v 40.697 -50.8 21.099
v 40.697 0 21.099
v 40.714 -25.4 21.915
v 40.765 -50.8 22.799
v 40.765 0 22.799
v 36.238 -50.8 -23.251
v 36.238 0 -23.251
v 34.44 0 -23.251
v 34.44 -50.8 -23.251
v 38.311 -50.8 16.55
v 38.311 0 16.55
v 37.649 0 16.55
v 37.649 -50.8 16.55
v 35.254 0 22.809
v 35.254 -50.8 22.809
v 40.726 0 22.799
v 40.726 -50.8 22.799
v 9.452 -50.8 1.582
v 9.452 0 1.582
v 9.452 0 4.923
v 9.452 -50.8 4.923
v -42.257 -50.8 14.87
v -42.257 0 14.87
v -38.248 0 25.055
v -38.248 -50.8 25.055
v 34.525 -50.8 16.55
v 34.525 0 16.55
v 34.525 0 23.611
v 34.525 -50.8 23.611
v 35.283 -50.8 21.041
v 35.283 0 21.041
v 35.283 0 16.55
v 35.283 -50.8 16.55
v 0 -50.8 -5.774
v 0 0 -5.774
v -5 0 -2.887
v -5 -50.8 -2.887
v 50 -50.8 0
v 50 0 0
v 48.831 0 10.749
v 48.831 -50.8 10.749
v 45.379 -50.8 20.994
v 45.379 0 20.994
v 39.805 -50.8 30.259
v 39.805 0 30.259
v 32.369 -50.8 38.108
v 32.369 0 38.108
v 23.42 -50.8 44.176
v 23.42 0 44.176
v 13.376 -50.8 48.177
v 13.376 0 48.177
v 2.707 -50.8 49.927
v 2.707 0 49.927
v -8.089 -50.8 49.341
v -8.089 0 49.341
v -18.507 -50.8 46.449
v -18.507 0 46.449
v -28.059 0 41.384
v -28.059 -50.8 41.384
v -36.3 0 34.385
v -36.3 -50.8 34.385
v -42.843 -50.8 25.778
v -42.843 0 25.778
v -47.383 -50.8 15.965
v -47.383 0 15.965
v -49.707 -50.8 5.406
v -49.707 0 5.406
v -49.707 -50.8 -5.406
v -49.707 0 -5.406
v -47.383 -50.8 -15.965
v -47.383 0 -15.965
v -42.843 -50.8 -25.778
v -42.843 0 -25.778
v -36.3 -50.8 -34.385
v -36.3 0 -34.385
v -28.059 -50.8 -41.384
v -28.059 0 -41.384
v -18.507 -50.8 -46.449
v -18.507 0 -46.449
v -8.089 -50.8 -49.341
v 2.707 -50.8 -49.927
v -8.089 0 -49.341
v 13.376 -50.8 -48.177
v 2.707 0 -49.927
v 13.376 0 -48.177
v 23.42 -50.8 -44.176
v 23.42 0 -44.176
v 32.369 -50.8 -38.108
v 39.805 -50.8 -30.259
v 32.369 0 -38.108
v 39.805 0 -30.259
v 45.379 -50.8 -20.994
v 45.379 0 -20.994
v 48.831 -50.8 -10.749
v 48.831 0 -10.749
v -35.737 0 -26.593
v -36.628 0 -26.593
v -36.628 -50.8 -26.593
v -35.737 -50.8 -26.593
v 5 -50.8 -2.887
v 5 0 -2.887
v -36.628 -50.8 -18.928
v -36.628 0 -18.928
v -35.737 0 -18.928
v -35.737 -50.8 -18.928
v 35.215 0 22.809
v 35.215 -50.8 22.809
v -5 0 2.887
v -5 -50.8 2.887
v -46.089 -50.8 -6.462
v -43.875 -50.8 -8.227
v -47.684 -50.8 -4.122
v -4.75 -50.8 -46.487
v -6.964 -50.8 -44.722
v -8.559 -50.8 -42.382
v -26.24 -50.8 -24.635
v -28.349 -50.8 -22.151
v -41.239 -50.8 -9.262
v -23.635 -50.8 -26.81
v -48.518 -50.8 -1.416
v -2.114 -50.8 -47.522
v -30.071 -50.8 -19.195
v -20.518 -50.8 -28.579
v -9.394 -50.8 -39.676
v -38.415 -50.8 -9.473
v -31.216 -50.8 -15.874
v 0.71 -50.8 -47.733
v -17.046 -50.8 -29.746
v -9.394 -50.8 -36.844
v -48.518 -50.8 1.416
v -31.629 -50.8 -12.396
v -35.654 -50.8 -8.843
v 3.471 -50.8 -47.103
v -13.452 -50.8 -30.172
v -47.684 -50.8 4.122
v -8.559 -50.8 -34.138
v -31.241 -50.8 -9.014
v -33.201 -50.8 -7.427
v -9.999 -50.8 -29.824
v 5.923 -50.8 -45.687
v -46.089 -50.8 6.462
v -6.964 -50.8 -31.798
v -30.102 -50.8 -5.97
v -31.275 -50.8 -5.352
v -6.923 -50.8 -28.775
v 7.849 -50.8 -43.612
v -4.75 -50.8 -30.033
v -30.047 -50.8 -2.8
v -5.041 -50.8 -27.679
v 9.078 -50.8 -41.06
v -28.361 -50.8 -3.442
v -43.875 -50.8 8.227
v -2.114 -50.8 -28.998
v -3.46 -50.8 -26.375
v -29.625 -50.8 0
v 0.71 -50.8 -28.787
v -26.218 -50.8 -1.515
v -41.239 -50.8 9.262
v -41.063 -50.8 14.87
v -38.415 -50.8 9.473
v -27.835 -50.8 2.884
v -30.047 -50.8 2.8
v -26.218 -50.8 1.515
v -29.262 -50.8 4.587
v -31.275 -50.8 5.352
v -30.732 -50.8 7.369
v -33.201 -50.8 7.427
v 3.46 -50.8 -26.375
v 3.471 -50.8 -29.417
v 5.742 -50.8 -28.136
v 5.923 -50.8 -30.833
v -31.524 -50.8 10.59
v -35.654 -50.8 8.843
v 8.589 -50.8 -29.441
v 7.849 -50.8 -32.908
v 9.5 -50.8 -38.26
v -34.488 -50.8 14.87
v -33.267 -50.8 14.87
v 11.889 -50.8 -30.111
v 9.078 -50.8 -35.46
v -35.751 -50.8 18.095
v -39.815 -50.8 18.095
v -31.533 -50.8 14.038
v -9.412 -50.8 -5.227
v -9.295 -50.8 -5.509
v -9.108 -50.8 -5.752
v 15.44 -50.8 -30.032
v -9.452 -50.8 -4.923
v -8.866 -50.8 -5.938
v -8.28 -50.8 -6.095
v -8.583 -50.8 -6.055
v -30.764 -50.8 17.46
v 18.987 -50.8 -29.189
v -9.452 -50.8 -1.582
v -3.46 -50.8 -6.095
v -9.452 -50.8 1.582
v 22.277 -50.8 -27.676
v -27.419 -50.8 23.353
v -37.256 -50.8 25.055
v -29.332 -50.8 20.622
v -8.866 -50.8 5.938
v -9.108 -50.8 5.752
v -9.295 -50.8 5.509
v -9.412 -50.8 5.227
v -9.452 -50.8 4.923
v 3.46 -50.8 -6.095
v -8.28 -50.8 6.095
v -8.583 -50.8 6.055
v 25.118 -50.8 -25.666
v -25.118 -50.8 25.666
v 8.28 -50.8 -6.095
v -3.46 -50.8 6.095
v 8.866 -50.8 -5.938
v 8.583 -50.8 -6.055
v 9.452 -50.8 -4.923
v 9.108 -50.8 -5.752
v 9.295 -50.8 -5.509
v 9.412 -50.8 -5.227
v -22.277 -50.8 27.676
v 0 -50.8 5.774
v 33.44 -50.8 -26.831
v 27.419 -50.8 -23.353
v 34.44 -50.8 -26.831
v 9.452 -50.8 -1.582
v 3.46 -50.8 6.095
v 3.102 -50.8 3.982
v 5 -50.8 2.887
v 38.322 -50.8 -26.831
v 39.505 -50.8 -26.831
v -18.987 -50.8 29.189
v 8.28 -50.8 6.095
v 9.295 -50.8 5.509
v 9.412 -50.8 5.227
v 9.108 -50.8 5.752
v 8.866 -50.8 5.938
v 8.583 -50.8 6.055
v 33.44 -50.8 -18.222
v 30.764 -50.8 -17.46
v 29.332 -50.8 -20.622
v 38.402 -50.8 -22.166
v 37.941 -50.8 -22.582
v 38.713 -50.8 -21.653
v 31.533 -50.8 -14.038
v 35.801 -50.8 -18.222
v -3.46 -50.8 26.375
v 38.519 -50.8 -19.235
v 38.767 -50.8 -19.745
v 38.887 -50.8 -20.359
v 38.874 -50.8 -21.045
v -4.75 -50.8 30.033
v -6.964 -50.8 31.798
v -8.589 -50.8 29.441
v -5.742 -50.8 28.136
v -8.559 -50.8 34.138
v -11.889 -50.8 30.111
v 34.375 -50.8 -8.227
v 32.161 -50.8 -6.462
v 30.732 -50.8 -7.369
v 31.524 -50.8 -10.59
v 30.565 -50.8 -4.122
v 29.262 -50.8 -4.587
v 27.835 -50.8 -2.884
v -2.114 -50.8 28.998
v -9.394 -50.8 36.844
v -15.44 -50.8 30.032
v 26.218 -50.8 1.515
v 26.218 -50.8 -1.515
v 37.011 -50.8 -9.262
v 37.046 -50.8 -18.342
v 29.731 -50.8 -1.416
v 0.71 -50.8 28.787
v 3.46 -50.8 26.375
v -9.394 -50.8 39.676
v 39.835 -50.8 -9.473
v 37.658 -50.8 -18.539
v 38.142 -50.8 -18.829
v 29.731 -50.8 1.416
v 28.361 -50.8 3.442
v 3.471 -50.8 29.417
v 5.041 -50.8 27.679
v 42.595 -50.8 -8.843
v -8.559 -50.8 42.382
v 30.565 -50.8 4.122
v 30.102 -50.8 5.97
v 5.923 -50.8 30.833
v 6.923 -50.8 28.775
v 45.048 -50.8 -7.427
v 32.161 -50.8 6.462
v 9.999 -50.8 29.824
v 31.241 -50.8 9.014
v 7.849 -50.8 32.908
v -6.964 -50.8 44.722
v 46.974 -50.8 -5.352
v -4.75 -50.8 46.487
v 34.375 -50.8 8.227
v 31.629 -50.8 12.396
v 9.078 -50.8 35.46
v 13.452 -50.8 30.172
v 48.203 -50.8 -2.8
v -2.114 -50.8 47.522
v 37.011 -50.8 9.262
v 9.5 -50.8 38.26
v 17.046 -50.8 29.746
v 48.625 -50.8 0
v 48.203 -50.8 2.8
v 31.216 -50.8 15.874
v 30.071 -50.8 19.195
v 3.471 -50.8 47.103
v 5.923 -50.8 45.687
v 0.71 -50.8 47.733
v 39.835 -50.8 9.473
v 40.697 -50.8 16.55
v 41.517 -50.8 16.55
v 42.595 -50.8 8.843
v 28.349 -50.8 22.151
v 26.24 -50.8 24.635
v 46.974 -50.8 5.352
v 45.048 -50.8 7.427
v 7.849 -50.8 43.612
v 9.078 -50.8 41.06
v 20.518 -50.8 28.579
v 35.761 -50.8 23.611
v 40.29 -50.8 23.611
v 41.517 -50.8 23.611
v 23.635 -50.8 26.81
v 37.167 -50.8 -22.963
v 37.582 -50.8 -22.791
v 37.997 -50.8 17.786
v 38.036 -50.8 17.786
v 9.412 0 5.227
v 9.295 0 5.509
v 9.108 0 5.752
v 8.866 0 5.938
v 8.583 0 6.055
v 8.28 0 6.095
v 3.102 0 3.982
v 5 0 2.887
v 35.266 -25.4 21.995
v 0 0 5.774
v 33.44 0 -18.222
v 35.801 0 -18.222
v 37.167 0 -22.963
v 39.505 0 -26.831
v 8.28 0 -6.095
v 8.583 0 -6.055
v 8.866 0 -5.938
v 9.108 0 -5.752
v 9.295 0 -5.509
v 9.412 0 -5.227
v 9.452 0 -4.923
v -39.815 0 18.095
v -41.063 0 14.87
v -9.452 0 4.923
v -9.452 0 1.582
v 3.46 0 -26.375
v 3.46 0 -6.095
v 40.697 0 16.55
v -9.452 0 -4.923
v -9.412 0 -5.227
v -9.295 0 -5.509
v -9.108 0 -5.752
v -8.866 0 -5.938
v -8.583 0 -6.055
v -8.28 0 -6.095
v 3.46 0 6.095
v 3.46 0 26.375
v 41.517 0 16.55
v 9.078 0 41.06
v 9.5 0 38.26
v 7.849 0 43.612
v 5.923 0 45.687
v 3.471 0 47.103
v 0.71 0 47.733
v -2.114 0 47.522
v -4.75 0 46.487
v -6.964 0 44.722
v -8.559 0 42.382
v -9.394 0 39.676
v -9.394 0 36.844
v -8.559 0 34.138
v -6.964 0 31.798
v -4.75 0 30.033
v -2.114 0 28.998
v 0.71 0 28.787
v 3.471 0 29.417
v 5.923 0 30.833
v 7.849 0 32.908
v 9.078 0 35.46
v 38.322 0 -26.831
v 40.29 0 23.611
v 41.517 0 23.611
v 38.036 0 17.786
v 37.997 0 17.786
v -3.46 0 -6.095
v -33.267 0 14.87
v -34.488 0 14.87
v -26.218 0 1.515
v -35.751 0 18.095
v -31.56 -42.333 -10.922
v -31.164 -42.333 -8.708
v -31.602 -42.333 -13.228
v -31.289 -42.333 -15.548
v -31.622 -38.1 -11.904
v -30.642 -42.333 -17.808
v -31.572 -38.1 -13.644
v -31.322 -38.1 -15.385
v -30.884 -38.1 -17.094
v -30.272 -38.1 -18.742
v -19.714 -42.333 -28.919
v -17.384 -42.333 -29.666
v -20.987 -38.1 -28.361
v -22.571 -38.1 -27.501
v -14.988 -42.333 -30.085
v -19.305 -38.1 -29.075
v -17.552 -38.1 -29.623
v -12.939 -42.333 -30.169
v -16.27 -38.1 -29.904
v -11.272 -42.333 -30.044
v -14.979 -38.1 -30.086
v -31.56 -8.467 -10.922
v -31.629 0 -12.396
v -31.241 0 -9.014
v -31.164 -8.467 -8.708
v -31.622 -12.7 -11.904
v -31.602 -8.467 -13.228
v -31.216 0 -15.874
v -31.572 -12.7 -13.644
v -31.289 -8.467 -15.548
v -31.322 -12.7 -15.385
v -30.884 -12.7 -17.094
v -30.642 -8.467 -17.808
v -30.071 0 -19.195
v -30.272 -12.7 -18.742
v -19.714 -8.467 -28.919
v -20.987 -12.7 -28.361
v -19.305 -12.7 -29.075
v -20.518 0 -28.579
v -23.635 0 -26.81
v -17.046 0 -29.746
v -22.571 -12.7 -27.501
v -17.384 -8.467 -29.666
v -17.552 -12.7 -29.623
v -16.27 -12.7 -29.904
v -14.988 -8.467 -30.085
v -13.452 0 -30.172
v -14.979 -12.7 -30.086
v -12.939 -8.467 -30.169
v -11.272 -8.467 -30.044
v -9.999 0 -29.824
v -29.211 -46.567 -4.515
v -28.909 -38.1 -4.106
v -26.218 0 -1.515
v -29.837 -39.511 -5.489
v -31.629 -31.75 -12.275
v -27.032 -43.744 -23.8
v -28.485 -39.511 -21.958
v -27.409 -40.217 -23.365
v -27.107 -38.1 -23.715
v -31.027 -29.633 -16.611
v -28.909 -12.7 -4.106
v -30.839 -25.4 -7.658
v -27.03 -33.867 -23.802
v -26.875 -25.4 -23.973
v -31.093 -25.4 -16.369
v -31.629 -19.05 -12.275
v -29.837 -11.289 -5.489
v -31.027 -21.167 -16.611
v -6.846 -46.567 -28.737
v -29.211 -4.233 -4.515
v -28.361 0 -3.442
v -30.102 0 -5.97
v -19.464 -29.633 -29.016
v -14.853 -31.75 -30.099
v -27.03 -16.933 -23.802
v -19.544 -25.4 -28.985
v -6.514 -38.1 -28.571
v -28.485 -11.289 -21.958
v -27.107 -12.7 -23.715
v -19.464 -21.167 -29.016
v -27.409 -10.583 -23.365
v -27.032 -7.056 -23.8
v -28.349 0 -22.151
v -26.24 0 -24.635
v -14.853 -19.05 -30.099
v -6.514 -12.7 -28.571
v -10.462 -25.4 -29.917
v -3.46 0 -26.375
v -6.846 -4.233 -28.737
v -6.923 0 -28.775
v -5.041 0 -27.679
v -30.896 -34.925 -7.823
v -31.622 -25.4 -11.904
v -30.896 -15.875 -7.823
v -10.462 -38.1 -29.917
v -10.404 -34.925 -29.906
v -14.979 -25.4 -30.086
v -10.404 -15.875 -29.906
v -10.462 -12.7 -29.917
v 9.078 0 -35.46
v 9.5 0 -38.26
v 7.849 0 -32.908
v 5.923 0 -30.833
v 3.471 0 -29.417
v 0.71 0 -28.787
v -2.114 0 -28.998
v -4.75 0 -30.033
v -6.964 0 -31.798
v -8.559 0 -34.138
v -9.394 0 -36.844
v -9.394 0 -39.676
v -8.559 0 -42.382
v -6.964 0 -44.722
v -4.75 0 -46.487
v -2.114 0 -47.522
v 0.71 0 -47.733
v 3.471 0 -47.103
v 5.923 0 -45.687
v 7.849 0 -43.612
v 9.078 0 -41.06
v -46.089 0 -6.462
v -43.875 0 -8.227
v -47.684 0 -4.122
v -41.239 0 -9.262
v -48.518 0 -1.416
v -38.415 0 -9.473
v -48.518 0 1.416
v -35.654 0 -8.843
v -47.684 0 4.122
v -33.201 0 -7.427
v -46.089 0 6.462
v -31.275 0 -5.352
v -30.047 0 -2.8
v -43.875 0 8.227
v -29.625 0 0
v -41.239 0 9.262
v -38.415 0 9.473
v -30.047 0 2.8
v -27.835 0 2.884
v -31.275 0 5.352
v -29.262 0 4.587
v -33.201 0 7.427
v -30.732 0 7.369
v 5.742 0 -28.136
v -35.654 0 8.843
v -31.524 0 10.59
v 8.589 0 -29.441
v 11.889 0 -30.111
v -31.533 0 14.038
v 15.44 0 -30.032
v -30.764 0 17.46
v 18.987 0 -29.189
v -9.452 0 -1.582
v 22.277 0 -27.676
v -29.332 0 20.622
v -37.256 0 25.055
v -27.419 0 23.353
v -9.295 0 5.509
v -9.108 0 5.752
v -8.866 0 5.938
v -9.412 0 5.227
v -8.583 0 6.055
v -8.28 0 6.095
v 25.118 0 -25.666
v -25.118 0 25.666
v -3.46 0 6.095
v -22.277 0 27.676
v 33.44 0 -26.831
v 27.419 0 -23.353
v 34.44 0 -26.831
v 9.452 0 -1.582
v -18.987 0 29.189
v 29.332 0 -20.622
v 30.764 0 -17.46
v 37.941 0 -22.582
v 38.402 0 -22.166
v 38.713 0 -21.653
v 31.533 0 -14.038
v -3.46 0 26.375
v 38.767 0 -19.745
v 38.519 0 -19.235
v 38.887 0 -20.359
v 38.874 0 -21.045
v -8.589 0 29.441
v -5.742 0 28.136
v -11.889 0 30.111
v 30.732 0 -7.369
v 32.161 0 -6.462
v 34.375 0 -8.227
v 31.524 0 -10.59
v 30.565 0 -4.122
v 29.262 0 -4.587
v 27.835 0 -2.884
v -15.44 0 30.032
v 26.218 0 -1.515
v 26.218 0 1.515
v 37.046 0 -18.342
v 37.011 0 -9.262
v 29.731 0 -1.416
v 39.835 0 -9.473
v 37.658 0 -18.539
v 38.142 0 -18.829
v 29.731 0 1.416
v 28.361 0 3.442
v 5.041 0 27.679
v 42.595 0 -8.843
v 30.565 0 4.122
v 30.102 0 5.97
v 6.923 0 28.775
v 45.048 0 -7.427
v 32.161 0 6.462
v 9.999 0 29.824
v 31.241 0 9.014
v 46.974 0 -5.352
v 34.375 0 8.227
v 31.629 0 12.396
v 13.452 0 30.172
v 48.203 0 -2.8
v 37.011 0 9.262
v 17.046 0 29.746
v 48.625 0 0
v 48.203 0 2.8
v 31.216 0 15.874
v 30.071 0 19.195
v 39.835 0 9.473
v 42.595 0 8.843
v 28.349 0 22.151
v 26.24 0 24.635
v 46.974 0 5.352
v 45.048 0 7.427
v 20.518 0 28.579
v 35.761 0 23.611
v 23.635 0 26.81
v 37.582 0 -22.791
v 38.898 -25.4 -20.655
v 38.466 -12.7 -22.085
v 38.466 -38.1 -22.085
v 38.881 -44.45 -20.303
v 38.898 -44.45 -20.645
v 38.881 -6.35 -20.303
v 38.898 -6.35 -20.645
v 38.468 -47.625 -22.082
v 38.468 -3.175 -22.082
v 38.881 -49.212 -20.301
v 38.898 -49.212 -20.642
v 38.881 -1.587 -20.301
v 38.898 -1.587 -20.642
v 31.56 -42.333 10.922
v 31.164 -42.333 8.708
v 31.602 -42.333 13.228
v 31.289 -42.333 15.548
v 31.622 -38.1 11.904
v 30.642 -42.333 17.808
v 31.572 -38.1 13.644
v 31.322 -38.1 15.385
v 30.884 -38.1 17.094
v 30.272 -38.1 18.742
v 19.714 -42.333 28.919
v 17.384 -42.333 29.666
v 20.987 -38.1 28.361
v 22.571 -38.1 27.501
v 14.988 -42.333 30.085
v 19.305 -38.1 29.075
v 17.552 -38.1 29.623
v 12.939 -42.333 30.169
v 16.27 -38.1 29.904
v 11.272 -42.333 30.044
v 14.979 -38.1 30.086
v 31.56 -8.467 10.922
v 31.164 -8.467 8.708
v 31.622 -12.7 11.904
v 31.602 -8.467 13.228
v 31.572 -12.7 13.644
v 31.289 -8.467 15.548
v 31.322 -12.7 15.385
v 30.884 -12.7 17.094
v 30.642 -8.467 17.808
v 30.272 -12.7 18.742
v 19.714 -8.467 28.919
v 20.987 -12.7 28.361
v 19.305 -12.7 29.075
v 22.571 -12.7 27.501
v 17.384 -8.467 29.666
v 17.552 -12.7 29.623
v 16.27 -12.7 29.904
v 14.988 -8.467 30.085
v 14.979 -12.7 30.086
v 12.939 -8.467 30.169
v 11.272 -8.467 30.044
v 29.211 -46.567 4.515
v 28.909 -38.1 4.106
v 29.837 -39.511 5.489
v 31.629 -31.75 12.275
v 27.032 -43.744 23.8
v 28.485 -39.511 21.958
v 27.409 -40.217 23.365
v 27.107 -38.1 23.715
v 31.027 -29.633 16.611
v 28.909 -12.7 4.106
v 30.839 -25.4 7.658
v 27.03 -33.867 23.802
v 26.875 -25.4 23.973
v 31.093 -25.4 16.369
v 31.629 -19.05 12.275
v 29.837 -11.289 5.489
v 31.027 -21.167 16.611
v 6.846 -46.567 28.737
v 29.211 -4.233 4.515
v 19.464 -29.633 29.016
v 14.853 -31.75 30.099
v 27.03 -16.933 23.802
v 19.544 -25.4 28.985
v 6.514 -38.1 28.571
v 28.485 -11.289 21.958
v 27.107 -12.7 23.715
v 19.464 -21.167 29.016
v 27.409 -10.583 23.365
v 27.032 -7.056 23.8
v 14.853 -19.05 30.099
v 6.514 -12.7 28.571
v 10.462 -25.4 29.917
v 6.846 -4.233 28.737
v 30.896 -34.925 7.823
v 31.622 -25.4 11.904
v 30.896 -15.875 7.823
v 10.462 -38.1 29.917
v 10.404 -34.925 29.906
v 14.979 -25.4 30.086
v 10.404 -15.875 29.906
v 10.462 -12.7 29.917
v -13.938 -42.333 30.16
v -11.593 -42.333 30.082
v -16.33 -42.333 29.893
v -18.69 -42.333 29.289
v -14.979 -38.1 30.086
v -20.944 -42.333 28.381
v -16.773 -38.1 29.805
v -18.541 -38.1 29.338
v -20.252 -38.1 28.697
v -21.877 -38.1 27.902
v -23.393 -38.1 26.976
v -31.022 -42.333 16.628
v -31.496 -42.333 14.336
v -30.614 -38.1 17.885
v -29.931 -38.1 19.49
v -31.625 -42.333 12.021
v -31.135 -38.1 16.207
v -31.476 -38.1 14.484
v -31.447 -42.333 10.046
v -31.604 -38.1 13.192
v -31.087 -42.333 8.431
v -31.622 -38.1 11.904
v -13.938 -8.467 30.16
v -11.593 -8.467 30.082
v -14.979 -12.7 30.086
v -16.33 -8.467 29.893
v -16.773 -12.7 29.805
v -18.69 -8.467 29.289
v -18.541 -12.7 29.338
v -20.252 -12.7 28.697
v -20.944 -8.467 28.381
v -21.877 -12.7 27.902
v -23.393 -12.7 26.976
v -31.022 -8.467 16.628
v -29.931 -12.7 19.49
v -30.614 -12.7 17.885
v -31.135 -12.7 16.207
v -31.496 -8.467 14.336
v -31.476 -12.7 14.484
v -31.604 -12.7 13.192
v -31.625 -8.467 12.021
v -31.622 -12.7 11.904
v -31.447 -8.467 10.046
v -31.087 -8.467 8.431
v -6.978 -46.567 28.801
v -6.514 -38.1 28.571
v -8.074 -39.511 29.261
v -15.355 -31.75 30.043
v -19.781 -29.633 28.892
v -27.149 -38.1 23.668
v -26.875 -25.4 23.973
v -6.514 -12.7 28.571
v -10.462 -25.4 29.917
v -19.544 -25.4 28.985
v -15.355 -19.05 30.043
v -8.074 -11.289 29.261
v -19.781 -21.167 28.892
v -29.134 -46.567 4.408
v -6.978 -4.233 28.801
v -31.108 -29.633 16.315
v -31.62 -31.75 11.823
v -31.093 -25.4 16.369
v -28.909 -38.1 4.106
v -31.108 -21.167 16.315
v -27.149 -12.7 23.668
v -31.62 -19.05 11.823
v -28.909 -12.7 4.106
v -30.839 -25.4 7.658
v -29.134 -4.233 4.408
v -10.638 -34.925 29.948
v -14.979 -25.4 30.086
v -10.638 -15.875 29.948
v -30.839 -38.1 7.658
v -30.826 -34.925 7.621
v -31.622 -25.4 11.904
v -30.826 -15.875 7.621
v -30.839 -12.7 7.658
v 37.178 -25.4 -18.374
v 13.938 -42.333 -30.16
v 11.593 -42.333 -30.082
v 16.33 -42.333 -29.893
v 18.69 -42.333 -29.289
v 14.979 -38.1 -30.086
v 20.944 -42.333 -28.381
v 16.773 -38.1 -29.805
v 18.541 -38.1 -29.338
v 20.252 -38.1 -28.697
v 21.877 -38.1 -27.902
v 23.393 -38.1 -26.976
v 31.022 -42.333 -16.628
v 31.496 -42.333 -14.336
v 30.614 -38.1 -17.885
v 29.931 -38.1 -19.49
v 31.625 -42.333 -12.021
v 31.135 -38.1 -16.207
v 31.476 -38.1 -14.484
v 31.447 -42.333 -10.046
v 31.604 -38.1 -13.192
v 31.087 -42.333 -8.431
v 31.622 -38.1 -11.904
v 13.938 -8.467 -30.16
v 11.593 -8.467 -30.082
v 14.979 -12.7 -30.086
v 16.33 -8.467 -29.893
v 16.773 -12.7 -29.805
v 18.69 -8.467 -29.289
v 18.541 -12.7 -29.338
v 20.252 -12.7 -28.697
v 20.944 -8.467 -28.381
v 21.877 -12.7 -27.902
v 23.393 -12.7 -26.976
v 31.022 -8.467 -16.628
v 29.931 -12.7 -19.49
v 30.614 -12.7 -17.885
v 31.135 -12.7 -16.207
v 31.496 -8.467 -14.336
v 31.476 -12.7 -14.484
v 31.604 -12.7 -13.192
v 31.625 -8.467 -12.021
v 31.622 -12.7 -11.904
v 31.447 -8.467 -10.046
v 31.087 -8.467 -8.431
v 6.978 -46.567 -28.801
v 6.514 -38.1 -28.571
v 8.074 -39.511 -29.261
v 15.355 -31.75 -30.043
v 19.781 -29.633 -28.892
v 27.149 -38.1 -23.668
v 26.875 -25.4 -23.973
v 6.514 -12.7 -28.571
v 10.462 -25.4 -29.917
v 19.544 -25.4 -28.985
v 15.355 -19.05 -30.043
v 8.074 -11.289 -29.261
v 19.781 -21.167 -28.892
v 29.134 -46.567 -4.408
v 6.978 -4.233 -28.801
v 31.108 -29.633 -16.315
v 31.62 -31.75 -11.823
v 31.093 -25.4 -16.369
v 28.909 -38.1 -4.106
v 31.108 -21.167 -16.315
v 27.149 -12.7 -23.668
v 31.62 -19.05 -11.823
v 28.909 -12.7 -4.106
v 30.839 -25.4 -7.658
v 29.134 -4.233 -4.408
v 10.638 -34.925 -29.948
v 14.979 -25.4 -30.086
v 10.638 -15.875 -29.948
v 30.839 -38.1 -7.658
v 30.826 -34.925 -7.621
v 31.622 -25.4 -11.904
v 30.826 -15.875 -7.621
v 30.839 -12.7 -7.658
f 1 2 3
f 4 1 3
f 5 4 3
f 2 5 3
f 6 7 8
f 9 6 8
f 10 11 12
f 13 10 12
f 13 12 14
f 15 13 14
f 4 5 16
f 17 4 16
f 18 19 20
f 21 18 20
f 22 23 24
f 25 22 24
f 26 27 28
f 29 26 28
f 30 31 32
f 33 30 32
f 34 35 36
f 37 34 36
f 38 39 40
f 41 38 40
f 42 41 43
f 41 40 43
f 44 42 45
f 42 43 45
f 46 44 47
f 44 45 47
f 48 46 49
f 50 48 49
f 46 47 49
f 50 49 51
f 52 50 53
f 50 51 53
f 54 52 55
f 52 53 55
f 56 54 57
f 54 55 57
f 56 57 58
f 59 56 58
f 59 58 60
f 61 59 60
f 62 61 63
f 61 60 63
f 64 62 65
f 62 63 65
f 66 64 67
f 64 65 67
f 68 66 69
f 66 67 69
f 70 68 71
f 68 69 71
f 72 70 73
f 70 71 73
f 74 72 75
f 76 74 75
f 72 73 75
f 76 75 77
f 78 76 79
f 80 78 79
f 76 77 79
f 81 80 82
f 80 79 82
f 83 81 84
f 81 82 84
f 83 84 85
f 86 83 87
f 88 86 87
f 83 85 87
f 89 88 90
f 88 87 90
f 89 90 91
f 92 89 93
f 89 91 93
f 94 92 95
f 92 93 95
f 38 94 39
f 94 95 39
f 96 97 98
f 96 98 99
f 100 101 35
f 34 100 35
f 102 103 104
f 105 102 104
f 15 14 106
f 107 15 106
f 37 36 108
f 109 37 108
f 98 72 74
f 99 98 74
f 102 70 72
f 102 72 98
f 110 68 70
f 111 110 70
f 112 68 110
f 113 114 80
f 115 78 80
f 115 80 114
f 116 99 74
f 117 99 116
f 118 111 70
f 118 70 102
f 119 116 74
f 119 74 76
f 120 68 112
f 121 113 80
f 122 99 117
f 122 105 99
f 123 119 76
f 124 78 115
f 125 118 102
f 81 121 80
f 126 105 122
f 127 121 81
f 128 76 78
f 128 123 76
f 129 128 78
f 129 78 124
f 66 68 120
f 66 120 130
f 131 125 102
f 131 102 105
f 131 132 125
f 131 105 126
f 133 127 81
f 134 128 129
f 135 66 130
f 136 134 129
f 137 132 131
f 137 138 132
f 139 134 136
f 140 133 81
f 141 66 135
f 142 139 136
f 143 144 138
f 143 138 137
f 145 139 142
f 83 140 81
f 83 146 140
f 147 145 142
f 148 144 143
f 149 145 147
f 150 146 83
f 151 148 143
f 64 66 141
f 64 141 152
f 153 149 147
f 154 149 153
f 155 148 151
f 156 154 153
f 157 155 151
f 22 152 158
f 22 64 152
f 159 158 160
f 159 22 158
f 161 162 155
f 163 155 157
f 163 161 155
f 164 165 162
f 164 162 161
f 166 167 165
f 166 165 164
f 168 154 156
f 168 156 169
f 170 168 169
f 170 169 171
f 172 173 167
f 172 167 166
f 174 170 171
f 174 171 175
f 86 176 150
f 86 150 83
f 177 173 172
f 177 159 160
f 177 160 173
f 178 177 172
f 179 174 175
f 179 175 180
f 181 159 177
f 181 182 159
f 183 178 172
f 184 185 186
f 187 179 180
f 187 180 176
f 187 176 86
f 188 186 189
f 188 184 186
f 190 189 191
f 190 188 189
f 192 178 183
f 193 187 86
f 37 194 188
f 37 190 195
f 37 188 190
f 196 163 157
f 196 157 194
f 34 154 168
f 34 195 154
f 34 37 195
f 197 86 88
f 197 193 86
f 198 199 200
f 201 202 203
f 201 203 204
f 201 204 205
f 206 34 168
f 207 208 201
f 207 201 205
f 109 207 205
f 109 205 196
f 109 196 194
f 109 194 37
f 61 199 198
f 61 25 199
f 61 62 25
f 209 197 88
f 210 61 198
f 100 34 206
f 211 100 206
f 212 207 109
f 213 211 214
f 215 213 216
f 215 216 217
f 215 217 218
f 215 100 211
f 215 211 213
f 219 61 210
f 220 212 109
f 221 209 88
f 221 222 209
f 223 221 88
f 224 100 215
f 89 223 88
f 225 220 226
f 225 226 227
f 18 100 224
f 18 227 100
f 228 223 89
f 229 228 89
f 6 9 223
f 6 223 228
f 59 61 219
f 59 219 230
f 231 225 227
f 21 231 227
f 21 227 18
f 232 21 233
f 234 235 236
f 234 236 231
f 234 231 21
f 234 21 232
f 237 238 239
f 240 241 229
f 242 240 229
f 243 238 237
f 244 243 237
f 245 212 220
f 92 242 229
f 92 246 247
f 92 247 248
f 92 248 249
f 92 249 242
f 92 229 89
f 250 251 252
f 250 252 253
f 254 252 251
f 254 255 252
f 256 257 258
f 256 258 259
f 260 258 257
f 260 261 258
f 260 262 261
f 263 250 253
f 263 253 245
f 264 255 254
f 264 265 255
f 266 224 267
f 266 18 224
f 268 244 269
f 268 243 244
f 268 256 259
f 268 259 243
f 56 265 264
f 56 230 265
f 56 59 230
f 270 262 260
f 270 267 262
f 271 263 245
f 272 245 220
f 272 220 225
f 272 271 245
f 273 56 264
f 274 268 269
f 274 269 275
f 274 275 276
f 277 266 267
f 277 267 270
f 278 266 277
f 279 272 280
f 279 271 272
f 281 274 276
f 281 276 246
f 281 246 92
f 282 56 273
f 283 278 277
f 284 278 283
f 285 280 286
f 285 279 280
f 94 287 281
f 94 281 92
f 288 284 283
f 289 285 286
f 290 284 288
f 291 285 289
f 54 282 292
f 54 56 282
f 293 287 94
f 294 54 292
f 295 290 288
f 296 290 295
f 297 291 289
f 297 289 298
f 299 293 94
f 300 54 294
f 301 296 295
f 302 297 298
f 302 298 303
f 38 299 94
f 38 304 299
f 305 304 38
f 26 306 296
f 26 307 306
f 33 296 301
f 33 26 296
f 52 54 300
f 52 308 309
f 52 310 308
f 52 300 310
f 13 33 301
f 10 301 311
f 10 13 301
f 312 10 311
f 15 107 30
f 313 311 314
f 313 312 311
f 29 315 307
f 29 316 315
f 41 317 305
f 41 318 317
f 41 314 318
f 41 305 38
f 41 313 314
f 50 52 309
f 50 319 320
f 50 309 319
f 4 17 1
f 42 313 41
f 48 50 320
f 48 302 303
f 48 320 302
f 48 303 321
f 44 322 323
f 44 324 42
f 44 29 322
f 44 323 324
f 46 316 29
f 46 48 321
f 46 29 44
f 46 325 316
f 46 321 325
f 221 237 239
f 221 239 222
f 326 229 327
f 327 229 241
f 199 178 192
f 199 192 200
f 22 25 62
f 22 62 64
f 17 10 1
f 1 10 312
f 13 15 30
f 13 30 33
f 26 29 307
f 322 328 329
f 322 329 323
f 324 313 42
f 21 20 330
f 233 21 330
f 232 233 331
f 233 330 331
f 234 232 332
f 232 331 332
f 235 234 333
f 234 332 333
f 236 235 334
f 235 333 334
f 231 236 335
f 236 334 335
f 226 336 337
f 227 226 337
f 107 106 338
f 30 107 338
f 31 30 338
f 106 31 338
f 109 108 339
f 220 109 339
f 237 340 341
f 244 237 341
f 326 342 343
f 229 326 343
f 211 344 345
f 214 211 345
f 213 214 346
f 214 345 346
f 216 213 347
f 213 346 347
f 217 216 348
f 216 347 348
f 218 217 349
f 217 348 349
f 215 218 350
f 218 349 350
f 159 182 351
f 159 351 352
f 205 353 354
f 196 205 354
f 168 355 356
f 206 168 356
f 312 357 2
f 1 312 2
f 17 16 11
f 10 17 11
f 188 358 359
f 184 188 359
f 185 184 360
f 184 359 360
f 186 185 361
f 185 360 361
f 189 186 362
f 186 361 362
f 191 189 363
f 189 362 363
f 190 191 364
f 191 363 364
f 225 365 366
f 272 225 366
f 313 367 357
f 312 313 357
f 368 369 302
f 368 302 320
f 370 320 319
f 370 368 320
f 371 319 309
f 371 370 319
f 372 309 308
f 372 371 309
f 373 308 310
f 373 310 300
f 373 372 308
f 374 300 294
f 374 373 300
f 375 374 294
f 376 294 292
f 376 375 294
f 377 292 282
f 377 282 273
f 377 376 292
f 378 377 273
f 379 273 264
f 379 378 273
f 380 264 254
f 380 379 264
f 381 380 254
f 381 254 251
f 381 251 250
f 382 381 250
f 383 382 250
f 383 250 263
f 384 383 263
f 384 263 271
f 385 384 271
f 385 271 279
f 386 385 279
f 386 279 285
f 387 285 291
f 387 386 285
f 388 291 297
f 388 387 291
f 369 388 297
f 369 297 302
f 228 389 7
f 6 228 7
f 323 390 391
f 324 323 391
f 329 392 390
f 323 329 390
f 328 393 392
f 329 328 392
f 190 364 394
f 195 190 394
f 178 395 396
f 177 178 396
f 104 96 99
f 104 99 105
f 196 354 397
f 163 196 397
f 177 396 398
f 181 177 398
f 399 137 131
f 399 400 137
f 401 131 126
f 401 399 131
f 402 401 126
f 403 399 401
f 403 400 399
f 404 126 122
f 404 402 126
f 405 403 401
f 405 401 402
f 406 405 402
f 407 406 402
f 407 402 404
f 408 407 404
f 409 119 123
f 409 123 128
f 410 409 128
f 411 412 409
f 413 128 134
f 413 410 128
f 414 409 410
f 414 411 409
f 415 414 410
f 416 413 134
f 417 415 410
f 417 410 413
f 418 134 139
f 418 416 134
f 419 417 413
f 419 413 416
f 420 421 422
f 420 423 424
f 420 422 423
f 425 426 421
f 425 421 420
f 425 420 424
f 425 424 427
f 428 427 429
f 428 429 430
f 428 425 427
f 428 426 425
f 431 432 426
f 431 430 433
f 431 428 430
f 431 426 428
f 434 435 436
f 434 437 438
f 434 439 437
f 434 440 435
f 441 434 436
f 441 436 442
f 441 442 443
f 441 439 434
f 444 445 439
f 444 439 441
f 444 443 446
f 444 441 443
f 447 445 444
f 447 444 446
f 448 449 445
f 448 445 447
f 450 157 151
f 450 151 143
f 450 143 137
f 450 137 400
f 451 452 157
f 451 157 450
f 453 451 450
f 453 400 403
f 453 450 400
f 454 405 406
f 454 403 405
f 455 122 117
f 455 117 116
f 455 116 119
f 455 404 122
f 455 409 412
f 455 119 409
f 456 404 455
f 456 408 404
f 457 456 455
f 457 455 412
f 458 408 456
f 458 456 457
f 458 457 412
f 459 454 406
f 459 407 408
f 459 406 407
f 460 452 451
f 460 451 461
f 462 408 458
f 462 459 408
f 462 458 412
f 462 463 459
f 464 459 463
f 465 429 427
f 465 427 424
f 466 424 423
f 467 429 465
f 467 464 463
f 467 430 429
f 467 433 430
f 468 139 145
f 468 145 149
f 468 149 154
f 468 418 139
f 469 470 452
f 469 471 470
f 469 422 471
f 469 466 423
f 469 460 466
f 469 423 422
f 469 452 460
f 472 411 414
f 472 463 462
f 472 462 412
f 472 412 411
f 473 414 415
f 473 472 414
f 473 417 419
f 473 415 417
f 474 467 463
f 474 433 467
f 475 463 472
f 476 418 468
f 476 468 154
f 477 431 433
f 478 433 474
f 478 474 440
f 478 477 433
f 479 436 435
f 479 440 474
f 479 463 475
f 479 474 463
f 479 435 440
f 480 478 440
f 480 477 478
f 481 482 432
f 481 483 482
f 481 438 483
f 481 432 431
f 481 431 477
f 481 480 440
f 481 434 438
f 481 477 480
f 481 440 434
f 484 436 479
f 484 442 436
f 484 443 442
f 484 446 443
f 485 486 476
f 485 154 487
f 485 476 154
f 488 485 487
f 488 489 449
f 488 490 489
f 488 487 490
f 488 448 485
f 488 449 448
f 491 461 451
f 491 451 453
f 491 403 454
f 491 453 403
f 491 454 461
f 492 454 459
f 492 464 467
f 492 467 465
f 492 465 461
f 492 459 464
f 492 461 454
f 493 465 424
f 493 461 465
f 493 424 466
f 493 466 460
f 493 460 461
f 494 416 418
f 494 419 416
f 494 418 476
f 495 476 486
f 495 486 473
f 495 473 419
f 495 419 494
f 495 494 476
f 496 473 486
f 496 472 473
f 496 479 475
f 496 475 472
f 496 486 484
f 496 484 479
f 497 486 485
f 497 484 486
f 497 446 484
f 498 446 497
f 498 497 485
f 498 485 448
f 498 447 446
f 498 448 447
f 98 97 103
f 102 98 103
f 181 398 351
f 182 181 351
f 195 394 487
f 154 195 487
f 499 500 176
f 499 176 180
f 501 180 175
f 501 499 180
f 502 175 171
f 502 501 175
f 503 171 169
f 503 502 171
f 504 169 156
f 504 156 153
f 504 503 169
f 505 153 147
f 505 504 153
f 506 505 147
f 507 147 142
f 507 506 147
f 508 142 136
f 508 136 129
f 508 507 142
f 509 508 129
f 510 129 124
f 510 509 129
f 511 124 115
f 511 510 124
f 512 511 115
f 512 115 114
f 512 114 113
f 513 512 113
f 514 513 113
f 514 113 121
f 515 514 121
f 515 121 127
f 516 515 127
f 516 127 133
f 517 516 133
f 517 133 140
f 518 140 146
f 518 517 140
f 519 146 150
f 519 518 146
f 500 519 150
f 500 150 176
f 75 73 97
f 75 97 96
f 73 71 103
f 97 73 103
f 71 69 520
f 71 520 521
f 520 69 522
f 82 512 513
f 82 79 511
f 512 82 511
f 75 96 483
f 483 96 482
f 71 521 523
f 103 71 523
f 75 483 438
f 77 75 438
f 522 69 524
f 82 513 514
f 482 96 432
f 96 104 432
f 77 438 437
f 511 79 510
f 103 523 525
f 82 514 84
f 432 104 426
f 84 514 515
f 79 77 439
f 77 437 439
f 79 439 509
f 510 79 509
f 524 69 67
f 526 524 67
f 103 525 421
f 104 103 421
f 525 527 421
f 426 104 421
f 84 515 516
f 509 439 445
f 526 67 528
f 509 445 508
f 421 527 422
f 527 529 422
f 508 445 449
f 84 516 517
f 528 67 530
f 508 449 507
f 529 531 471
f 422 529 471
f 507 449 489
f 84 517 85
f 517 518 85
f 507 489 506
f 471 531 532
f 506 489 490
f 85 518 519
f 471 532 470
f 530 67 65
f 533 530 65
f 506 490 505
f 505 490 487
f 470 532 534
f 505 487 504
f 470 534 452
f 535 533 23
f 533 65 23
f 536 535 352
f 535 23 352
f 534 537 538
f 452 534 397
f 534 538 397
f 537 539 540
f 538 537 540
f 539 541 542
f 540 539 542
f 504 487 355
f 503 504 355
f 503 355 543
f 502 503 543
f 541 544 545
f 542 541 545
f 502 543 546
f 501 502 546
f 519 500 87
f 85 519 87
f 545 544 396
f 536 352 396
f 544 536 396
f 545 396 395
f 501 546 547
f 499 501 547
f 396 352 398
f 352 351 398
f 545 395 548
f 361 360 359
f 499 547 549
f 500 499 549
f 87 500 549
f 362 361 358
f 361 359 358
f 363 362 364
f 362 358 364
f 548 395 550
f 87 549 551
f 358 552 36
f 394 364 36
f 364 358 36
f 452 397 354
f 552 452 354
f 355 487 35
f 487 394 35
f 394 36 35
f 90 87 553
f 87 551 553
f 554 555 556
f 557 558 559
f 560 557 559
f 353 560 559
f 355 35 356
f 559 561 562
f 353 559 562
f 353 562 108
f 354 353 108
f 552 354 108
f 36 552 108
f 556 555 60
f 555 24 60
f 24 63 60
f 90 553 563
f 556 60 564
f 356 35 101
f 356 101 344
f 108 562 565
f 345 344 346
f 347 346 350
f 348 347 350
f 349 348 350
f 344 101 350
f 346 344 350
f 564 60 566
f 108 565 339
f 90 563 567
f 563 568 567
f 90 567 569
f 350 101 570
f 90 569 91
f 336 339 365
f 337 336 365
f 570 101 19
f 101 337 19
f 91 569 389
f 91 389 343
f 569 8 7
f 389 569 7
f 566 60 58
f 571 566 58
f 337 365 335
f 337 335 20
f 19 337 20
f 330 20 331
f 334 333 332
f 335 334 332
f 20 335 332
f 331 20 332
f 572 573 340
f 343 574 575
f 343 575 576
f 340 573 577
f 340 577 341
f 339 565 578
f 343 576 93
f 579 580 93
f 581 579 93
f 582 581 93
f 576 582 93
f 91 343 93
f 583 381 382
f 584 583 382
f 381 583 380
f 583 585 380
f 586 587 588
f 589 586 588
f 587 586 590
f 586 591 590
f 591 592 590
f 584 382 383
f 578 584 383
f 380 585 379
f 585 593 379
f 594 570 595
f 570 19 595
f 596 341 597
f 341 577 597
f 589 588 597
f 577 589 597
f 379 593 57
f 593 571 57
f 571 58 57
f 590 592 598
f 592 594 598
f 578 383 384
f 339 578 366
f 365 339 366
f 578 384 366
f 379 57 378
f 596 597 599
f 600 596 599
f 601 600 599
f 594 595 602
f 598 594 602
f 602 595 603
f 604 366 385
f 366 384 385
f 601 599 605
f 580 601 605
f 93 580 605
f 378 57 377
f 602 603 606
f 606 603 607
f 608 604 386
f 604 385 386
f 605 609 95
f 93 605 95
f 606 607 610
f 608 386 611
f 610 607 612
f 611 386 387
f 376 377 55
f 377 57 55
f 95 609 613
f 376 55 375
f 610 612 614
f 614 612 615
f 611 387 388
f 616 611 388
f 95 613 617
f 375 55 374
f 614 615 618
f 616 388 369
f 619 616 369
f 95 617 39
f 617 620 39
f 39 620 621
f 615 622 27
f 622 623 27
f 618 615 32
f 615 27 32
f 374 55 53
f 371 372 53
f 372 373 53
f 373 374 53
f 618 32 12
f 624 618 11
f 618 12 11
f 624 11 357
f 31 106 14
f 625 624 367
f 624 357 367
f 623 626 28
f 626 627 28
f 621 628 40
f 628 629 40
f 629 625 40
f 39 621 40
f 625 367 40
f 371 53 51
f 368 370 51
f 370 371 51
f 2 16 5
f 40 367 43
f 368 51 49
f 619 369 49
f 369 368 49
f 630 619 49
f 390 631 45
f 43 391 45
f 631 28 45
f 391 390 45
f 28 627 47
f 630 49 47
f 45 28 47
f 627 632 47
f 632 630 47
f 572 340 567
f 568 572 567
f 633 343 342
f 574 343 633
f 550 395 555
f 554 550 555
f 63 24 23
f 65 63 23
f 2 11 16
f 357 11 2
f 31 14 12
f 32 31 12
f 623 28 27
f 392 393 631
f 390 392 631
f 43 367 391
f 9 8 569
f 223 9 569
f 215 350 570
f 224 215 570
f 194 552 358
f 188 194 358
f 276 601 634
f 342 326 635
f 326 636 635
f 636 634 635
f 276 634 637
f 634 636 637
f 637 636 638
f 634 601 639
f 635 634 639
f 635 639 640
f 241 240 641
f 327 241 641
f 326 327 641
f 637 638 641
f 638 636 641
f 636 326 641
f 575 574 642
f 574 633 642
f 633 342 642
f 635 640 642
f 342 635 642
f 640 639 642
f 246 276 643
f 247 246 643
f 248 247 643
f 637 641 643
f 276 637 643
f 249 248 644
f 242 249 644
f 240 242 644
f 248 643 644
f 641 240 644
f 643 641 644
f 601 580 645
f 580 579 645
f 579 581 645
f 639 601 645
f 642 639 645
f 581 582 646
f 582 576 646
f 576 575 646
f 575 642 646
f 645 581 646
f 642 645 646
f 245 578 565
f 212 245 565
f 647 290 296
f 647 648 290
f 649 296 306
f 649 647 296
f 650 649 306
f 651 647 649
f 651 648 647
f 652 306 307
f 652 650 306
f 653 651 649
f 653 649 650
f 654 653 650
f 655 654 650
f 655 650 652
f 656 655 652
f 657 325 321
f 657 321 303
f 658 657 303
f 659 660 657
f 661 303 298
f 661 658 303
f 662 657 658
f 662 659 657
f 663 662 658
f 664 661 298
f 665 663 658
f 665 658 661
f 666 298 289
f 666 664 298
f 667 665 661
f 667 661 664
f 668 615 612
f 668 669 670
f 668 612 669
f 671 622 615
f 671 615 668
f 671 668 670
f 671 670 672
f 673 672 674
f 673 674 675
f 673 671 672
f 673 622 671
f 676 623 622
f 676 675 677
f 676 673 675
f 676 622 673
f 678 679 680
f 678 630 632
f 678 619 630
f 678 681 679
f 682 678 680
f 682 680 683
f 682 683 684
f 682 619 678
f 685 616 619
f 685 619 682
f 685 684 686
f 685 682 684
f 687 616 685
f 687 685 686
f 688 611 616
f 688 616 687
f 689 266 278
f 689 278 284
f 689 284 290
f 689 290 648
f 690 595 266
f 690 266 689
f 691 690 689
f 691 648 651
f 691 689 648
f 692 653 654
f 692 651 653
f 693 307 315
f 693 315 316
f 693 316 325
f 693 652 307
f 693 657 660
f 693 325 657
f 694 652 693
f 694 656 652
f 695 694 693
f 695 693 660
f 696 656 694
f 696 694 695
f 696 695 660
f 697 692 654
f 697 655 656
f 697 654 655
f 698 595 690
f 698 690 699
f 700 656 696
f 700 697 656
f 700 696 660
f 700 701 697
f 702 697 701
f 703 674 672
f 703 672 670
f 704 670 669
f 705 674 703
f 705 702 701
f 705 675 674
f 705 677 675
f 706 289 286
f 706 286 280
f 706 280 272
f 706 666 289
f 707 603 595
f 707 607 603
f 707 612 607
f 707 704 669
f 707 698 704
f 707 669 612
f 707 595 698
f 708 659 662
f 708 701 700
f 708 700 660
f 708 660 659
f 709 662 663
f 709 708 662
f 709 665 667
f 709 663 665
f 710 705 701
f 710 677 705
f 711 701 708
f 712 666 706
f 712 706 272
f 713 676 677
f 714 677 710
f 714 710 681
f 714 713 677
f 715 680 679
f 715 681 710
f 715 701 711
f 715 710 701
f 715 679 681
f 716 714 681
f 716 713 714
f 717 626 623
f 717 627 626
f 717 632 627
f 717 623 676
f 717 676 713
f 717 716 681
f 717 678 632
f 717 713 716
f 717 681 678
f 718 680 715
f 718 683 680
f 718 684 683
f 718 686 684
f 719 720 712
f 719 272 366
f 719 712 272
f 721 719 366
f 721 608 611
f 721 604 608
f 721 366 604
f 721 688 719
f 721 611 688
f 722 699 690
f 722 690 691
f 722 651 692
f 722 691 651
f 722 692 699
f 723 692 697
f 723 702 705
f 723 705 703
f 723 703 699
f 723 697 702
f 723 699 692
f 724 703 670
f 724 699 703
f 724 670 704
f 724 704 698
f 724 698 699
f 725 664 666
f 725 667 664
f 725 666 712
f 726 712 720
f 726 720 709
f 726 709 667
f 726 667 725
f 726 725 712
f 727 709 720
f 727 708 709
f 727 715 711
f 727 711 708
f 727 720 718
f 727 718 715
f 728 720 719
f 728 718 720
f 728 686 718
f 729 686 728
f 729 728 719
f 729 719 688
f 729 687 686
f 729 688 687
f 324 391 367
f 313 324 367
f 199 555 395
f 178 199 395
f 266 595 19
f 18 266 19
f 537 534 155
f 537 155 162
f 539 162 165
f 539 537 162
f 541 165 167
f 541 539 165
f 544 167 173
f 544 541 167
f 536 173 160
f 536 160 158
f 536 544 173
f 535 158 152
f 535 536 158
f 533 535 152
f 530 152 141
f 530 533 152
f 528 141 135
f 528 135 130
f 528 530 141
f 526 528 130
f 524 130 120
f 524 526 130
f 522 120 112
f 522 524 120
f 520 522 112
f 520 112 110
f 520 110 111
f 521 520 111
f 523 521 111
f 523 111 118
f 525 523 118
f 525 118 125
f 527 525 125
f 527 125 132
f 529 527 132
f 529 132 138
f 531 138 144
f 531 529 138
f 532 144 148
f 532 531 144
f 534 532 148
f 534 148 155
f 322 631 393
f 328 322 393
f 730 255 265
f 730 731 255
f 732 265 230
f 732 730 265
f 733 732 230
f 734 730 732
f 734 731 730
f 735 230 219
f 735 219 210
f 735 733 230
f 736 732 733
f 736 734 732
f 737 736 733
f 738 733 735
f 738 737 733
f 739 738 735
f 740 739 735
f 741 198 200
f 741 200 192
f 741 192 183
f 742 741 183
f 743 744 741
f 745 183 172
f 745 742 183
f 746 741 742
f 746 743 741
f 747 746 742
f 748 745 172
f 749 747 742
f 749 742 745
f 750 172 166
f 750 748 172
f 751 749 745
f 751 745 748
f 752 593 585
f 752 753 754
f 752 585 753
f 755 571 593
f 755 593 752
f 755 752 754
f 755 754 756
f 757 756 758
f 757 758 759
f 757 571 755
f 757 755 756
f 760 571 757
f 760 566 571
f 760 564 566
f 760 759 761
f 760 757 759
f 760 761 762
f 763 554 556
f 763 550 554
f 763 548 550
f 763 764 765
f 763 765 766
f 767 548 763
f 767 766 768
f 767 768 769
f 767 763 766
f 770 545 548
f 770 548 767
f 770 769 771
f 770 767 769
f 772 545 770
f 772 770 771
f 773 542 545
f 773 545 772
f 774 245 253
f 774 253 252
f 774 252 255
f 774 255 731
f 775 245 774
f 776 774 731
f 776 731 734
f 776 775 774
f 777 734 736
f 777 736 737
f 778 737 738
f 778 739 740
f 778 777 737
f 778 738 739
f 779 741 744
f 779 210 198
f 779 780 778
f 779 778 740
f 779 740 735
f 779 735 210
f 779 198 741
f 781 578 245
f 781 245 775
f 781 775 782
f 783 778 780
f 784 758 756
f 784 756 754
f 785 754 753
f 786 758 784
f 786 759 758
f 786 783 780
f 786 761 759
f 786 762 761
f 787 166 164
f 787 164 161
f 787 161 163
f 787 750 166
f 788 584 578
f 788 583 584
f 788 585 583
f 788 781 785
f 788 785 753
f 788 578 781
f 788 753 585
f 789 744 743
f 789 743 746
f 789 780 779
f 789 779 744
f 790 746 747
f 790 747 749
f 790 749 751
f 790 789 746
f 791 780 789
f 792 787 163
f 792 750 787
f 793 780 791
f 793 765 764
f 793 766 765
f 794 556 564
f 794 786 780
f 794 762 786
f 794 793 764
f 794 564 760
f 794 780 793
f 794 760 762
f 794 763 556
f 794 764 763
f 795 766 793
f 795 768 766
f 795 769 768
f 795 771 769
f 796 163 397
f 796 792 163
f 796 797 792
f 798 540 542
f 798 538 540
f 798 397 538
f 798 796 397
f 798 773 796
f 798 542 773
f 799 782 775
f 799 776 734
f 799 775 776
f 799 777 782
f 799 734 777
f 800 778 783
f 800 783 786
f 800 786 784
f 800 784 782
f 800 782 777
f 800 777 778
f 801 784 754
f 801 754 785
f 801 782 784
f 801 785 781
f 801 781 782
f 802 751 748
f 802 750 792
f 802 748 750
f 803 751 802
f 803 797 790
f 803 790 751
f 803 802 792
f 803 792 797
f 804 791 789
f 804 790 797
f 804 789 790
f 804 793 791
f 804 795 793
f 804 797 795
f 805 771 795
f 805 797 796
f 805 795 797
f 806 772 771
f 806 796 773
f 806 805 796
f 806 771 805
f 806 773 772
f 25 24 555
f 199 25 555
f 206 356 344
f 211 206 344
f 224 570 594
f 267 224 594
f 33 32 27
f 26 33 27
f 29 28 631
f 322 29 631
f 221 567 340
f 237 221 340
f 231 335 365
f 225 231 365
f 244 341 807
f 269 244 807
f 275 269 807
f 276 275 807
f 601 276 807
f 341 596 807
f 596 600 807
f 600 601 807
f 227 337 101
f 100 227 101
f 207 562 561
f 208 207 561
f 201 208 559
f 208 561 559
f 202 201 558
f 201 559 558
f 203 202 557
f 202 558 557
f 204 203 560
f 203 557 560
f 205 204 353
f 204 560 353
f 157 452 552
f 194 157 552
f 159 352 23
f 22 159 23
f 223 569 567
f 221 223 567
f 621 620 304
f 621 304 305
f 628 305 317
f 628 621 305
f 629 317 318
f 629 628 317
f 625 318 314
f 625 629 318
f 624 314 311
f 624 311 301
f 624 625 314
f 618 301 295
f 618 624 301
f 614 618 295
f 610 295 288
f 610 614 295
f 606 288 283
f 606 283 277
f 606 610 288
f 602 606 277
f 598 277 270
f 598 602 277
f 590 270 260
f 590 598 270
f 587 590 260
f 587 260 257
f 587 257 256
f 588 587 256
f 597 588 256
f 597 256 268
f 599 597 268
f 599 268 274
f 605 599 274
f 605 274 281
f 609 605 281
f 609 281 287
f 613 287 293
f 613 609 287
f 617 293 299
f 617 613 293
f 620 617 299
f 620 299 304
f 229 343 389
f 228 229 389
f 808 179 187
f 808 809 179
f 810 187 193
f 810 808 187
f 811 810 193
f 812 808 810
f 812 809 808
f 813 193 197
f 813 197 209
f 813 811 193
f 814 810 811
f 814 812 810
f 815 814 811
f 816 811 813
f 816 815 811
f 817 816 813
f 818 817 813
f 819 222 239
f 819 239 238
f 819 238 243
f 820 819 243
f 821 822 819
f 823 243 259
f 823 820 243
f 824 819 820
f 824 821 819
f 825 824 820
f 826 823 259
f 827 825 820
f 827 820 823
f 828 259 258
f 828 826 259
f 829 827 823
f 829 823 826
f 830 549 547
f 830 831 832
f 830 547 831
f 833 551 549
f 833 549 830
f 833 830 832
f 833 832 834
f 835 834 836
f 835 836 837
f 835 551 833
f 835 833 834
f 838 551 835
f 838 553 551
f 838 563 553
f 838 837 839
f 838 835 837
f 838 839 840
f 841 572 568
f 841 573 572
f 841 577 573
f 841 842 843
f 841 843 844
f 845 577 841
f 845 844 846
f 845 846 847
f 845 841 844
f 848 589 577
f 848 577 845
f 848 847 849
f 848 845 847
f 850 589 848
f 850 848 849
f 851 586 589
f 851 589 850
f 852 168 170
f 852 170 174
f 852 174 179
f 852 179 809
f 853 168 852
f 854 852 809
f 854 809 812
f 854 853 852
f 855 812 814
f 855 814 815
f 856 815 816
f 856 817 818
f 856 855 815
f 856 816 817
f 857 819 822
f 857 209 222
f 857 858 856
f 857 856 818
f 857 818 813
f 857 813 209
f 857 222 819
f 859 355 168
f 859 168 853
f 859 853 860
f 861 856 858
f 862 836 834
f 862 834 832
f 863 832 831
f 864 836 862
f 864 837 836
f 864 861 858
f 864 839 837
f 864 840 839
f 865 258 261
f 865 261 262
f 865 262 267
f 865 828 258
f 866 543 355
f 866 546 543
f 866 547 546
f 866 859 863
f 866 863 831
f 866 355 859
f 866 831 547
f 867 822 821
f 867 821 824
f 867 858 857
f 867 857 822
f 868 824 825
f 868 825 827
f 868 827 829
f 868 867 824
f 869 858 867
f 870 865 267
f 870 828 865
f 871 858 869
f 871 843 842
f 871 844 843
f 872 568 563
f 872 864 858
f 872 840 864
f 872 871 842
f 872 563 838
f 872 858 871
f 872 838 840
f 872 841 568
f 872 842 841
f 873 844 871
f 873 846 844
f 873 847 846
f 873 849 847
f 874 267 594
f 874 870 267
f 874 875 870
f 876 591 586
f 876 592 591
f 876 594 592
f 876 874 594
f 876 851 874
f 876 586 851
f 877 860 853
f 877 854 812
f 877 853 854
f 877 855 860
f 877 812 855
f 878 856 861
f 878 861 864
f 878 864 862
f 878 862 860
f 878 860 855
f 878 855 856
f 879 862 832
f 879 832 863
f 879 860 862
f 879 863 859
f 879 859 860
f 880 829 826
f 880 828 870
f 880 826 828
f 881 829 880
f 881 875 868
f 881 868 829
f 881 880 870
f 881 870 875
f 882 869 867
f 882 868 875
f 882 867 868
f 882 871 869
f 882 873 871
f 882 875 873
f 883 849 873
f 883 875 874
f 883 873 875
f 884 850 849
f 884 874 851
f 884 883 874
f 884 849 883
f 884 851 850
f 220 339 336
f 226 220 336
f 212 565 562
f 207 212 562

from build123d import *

# Parameters (mm, degrees)
F0_R     = 50
F0_W     = 0.8909073204
F0_H     = 7.6658296548
F0_R_2   = 9.5
F1_DEPTH = 50.8


with BuildPart() as f1:
    # F0 (on Front) → F1 (new body)
    with BuildSketch(Plane.XZ):
        Circle(F0_R)
        with Locations((-36.1827932026, -22.7605821956)):
            Rectangle(F0_W, F0_H, mode=Mode.SUBTRACT)
        with BuildLine():
            add(Edge.make_bspline(
                [(-26.2180610272, -1.514530619), (-39.046874665, -10.6765138668), (-26.8747687945, -23.9734832309), (-14.7026629239, -37.270452595), (-3.4604447998, -26.3752514337)],
                knots=[2.9144324344, 2.9144324344, 2.9144324344, 4.5504484069, 4.5504484069, 6.1864643793, 6.1864643793, 6.1864643793], degree=2, weights=[1, 0.6836763053, 1, 0.6836763053, 1]))
            Line((-26.2180610272, -1.514530619), (-9.4517278188, -1.5823676949))
            Line((-9.4517278188, -1.5823676949), (-9.4517278188, -4.923182711))
            ThreePointArc((-9.4517278188, -4.923182711), (-9.108457703, -5.7519100802), (-8.2797303337, -6.095180196))
            Line((-8.2797303337, -6.095180196), (-3.4604447998, -6.095180196))
            Line((-3.4604447998, -6.095180196), (-3.4604447998, -26.3752514337))
        make_face(mode=Mode.SUBTRACT)
        with Locations((0, -38.2600314915)):
            Circle(F0_R_2, mode=Mode.SUBTRACT)
        with BuildLine():
            add(Edge.make_bspline(
                [(3.4604447998, -26.3752514337), (14.7026629239, -37.270452595), (26.8747687945, -23.9734832309), (39.046874665, -10.6765138668), (26.2180610272, -1.514530619)],
                knots=[0.0967209279, 0.0967209279, 0.0967209279, 1.7327369003, 1.7327369003, 3.3687528727, 3.3687528727, 3.3687528727], degree=2, weights=[1, 0.6836763053, 1, 0.6836763053, 1]))
            Line((3.4604447998, -26.3752514337), (3.4604447998, -6.095180196))
            Line((3.4604447998, -6.095180196), (8.2797303337, -6.095180196))
            ThreePointArc((8.2797303337, -6.095180196), (9.108457703, -5.7519100802), (9.4517278188, -4.923182711))
            Line((9.4517278188, -4.923182711), (9.4517278188, -1.5823676949))
            Line((9.4517278188, -1.5823676949), (26.2180610272, -1.514530619))
        make_face(mode=Mode.SUBTRACT)
        with BuildLine():
            Line((36.2378211289, -23.251237317), (34.4402093255, -23.251237317))
            Line((34.4402093255, -23.251237317), (34.4402093255, -26.8313866109))
            Line((34.4402093255, -26.8313866109), (33.4396518123, -26.8313866109))
            Line((33.4396518123, -26.8313866109), (33.4396518123, -18.2220697037))
            Line((33.4396518123, -18.2220697037), (35.8006660572, -18.2220697037))
            add(Edge.make_bspline(
                [(35.8006660572, -18.2220697037), (37.385353192, -18.2220697037), (38.1418952665, -18.8288107945)],
                knots=[0, 0, 0, 1, 1, 1], degree=2))
            add(Edge.make_bspline(
                [(38.1418952665, -18.8288107945), (38.8984373409, -19.4355518854), (38.8984373409, -20.6546869344)],
                knots=[0, 0, 0, 1, 1, 1], degree=2))
            add(Edge.make_bspline(
                [(38.8984373409, -20.6546869344), (38.8984373409, -22.3618528608), (37.1667756562, -22.9629410844)],
                knots=[0, 0, 0, 1, 1, 1], degree=2))
            Line((37.1667756562, -22.9629410844), (39.5051784318, -26.8313866109))
            Line((39.5051784318, -26.8313866109), (38.3218448757, -26.8313866109))
            Line((38.3218448757, -26.8313866109), (36.2378211289, -23.251237317))
        make_face(mode=Mode.SUBTRACT)
        with Locations((-39.1245670617, 0)):
            Circle(F0_R_2, mode=Mode.SUBTRACT)
        Polygon((-33.2667540933, 14.8699637502), (-34.4876703716, 14.8699637502), (-35.7507637576, 18.0954025725), (-39.8153050402, 18.0954025725), (-41.0628594917, 14.8699637502), (-42.2571375966, 14.8699637502), (-38.2480925085, 25.0546253584), (-37.2558205515, 25.0546253584), align=None, mode=Mode.SUBTRACT)
        with BuildLine():
            Line((-3.4604447998, 26.3752514337), (-3.4604447998, 6.095180196))
            Line((-3.4604447998, 6.095180196), (-8.2797303337, 6.095180196))
            ThreePointArc((-8.2797303337, 6.095180196), (-9.108457703, 5.7519100802), (-9.4517278188, 4.923182711))
            Line((-9.4517278188, 4.923182711), (-9.4517278188, 1.5823676949))
            Line((-9.4517278188, 1.5823676949), (-26.2180610272, 1.514530619))
            add(Edge.make_bspline(
                [(-3.4604447998, 26.3752514337), (-14.7026629239, 37.270452595), (-26.8747687945, 23.9734832309), (-39.046874665, 10.6765138668), (-26.2180610272, 1.514530619)],
                knots=[0.0967209279, 0.0967209279, 0.0967209279, 1.7327369003, 1.7327369003, 3.3687528727, 3.3687528727, 3.3687528727], degree=2, weights=[1, 0.6836763053, 1, 0.6836763053, 1]))
        make_face(mode=Mode.SUBTRACT)
        Polygon((3.1021658797, 3.9824663862), (5, 2.8867513459), (5, -2.8867513459), (0, -5.7735026919), (-5, -2.8867513459), (-5, 2.8867513459), (0, 5.7735026919), align=None, mode=Mode.SUBTRACT)
        with BuildLine():
            add(Edge.make_bspline(
                [(26.2180610272, 1.514530619), (39.046874665, 10.6765138668), (26.8747687945, 23.9734832309), (14.7026629239, 37.270452595), (3.4604447998, 26.3752514337)],
                knots=[2.9144324344, 2.9144324344, 2.9144324344, 4.5504484069, 4.5504484069, 6.1864643793, 6.1864643793, 6.1864643793], degree=2, weights=[1, 0.6836763053, 1, 0.6836763053, 1]))
            Line((26.2180610272, 1.514530619), (9.4517278188, 1.5823676949))
            Line((9.4517278188, 1.5823676949), (9.4517278188, 4.923182711))
            ThreePointArc((9.4517278188, 4.923182711), (9.108457703, 5.7519100802), (8.2797303337, 6.095180196))
            Line((8.2797303337, 6.095180196), (3.4604447998, 6.095180196))
            Line((3.4604447998, 6.095180196), (3.4604447998, 26.3752514337))
        make_face(mode=Mode.SUBTRACT)
        with Locations((39.1245670617, 0)):
            Circle(F0_R_2, mode=Mode.SUBTRACT)
        with BuildLine():
            Line((38.3105899637, 16.5501786396), (37.6492086511, 16.5501786396))
            Line((37.6492086511, 16.5501786396), (35.2540193182, 22.8085765739))
            Line((35.2540193182, 22.8085765739), (35.2153872322, 22.8085765739))
            add(Edge.make_bspline(
                [(35.2153872322, 22.8085765739), (35.2833797036, 22.065295239), (35.2833797036, 21.0407723179)],
                knots=[0, 0, 0, 1, 1, 1], degree=2))
            Line((35.2833797036, 21.0407723179), (35.2833797036, 16.5501786396))
            Line((35.2833797036, 16.5501786396), (34.5246455343, 16.5501786396))
            Line((34.5246455343, 16.5501786396), (34.5246455343, 23.6105786795))
            Line((34.5246455343, 23.6105786795), (35.7608722867, 23.6105786795))
            Line((35.7608722867, 23.6105786795), (37.9968974252, 17.786405392))
            Line((37.9968974252, 17.786405392), (38.0355295112, 17.786405392))
            Line((38.0355295112, 17.786405392), (40.290098051, 23.6105786795))
            Line((40.290098051, 23.6105786795), (41.5170531028, 23.6105786795))
            Line((41.5170531028, 23.6105786795), (41.5170531028, 16.5501786396))
            Line((41.5170531028, 16.5501786396), (40.6965075959, 16.5501786396))
            Line((40.6965075959, 16.5501786396), (40.6965075959, 21.0994930886))
            add(Edge.make_bspline(
                [(40.6965075959, 21.0994930886), (40.6965075959, 21.8814065095), (40.7645000673, 22.7993048732)],
                knots=[0, 0, 0, 1, 1, 1], degree=2))
            Line((40.7645000673, 22.7993048732), (40.7258679813, 22.7993048732))
            Line((40.7258679813, 22.7993048732), (38.3105899637, 16.5501786396))
        make_face(mode=Mode.SUBTRACT)
        with Locations((0, 38.2600314915)):
            Circle(F0_R_2, mode=Mode.SUBTRACT)
    extrude(amount=F1_DEPTH)


solid = f1.part
